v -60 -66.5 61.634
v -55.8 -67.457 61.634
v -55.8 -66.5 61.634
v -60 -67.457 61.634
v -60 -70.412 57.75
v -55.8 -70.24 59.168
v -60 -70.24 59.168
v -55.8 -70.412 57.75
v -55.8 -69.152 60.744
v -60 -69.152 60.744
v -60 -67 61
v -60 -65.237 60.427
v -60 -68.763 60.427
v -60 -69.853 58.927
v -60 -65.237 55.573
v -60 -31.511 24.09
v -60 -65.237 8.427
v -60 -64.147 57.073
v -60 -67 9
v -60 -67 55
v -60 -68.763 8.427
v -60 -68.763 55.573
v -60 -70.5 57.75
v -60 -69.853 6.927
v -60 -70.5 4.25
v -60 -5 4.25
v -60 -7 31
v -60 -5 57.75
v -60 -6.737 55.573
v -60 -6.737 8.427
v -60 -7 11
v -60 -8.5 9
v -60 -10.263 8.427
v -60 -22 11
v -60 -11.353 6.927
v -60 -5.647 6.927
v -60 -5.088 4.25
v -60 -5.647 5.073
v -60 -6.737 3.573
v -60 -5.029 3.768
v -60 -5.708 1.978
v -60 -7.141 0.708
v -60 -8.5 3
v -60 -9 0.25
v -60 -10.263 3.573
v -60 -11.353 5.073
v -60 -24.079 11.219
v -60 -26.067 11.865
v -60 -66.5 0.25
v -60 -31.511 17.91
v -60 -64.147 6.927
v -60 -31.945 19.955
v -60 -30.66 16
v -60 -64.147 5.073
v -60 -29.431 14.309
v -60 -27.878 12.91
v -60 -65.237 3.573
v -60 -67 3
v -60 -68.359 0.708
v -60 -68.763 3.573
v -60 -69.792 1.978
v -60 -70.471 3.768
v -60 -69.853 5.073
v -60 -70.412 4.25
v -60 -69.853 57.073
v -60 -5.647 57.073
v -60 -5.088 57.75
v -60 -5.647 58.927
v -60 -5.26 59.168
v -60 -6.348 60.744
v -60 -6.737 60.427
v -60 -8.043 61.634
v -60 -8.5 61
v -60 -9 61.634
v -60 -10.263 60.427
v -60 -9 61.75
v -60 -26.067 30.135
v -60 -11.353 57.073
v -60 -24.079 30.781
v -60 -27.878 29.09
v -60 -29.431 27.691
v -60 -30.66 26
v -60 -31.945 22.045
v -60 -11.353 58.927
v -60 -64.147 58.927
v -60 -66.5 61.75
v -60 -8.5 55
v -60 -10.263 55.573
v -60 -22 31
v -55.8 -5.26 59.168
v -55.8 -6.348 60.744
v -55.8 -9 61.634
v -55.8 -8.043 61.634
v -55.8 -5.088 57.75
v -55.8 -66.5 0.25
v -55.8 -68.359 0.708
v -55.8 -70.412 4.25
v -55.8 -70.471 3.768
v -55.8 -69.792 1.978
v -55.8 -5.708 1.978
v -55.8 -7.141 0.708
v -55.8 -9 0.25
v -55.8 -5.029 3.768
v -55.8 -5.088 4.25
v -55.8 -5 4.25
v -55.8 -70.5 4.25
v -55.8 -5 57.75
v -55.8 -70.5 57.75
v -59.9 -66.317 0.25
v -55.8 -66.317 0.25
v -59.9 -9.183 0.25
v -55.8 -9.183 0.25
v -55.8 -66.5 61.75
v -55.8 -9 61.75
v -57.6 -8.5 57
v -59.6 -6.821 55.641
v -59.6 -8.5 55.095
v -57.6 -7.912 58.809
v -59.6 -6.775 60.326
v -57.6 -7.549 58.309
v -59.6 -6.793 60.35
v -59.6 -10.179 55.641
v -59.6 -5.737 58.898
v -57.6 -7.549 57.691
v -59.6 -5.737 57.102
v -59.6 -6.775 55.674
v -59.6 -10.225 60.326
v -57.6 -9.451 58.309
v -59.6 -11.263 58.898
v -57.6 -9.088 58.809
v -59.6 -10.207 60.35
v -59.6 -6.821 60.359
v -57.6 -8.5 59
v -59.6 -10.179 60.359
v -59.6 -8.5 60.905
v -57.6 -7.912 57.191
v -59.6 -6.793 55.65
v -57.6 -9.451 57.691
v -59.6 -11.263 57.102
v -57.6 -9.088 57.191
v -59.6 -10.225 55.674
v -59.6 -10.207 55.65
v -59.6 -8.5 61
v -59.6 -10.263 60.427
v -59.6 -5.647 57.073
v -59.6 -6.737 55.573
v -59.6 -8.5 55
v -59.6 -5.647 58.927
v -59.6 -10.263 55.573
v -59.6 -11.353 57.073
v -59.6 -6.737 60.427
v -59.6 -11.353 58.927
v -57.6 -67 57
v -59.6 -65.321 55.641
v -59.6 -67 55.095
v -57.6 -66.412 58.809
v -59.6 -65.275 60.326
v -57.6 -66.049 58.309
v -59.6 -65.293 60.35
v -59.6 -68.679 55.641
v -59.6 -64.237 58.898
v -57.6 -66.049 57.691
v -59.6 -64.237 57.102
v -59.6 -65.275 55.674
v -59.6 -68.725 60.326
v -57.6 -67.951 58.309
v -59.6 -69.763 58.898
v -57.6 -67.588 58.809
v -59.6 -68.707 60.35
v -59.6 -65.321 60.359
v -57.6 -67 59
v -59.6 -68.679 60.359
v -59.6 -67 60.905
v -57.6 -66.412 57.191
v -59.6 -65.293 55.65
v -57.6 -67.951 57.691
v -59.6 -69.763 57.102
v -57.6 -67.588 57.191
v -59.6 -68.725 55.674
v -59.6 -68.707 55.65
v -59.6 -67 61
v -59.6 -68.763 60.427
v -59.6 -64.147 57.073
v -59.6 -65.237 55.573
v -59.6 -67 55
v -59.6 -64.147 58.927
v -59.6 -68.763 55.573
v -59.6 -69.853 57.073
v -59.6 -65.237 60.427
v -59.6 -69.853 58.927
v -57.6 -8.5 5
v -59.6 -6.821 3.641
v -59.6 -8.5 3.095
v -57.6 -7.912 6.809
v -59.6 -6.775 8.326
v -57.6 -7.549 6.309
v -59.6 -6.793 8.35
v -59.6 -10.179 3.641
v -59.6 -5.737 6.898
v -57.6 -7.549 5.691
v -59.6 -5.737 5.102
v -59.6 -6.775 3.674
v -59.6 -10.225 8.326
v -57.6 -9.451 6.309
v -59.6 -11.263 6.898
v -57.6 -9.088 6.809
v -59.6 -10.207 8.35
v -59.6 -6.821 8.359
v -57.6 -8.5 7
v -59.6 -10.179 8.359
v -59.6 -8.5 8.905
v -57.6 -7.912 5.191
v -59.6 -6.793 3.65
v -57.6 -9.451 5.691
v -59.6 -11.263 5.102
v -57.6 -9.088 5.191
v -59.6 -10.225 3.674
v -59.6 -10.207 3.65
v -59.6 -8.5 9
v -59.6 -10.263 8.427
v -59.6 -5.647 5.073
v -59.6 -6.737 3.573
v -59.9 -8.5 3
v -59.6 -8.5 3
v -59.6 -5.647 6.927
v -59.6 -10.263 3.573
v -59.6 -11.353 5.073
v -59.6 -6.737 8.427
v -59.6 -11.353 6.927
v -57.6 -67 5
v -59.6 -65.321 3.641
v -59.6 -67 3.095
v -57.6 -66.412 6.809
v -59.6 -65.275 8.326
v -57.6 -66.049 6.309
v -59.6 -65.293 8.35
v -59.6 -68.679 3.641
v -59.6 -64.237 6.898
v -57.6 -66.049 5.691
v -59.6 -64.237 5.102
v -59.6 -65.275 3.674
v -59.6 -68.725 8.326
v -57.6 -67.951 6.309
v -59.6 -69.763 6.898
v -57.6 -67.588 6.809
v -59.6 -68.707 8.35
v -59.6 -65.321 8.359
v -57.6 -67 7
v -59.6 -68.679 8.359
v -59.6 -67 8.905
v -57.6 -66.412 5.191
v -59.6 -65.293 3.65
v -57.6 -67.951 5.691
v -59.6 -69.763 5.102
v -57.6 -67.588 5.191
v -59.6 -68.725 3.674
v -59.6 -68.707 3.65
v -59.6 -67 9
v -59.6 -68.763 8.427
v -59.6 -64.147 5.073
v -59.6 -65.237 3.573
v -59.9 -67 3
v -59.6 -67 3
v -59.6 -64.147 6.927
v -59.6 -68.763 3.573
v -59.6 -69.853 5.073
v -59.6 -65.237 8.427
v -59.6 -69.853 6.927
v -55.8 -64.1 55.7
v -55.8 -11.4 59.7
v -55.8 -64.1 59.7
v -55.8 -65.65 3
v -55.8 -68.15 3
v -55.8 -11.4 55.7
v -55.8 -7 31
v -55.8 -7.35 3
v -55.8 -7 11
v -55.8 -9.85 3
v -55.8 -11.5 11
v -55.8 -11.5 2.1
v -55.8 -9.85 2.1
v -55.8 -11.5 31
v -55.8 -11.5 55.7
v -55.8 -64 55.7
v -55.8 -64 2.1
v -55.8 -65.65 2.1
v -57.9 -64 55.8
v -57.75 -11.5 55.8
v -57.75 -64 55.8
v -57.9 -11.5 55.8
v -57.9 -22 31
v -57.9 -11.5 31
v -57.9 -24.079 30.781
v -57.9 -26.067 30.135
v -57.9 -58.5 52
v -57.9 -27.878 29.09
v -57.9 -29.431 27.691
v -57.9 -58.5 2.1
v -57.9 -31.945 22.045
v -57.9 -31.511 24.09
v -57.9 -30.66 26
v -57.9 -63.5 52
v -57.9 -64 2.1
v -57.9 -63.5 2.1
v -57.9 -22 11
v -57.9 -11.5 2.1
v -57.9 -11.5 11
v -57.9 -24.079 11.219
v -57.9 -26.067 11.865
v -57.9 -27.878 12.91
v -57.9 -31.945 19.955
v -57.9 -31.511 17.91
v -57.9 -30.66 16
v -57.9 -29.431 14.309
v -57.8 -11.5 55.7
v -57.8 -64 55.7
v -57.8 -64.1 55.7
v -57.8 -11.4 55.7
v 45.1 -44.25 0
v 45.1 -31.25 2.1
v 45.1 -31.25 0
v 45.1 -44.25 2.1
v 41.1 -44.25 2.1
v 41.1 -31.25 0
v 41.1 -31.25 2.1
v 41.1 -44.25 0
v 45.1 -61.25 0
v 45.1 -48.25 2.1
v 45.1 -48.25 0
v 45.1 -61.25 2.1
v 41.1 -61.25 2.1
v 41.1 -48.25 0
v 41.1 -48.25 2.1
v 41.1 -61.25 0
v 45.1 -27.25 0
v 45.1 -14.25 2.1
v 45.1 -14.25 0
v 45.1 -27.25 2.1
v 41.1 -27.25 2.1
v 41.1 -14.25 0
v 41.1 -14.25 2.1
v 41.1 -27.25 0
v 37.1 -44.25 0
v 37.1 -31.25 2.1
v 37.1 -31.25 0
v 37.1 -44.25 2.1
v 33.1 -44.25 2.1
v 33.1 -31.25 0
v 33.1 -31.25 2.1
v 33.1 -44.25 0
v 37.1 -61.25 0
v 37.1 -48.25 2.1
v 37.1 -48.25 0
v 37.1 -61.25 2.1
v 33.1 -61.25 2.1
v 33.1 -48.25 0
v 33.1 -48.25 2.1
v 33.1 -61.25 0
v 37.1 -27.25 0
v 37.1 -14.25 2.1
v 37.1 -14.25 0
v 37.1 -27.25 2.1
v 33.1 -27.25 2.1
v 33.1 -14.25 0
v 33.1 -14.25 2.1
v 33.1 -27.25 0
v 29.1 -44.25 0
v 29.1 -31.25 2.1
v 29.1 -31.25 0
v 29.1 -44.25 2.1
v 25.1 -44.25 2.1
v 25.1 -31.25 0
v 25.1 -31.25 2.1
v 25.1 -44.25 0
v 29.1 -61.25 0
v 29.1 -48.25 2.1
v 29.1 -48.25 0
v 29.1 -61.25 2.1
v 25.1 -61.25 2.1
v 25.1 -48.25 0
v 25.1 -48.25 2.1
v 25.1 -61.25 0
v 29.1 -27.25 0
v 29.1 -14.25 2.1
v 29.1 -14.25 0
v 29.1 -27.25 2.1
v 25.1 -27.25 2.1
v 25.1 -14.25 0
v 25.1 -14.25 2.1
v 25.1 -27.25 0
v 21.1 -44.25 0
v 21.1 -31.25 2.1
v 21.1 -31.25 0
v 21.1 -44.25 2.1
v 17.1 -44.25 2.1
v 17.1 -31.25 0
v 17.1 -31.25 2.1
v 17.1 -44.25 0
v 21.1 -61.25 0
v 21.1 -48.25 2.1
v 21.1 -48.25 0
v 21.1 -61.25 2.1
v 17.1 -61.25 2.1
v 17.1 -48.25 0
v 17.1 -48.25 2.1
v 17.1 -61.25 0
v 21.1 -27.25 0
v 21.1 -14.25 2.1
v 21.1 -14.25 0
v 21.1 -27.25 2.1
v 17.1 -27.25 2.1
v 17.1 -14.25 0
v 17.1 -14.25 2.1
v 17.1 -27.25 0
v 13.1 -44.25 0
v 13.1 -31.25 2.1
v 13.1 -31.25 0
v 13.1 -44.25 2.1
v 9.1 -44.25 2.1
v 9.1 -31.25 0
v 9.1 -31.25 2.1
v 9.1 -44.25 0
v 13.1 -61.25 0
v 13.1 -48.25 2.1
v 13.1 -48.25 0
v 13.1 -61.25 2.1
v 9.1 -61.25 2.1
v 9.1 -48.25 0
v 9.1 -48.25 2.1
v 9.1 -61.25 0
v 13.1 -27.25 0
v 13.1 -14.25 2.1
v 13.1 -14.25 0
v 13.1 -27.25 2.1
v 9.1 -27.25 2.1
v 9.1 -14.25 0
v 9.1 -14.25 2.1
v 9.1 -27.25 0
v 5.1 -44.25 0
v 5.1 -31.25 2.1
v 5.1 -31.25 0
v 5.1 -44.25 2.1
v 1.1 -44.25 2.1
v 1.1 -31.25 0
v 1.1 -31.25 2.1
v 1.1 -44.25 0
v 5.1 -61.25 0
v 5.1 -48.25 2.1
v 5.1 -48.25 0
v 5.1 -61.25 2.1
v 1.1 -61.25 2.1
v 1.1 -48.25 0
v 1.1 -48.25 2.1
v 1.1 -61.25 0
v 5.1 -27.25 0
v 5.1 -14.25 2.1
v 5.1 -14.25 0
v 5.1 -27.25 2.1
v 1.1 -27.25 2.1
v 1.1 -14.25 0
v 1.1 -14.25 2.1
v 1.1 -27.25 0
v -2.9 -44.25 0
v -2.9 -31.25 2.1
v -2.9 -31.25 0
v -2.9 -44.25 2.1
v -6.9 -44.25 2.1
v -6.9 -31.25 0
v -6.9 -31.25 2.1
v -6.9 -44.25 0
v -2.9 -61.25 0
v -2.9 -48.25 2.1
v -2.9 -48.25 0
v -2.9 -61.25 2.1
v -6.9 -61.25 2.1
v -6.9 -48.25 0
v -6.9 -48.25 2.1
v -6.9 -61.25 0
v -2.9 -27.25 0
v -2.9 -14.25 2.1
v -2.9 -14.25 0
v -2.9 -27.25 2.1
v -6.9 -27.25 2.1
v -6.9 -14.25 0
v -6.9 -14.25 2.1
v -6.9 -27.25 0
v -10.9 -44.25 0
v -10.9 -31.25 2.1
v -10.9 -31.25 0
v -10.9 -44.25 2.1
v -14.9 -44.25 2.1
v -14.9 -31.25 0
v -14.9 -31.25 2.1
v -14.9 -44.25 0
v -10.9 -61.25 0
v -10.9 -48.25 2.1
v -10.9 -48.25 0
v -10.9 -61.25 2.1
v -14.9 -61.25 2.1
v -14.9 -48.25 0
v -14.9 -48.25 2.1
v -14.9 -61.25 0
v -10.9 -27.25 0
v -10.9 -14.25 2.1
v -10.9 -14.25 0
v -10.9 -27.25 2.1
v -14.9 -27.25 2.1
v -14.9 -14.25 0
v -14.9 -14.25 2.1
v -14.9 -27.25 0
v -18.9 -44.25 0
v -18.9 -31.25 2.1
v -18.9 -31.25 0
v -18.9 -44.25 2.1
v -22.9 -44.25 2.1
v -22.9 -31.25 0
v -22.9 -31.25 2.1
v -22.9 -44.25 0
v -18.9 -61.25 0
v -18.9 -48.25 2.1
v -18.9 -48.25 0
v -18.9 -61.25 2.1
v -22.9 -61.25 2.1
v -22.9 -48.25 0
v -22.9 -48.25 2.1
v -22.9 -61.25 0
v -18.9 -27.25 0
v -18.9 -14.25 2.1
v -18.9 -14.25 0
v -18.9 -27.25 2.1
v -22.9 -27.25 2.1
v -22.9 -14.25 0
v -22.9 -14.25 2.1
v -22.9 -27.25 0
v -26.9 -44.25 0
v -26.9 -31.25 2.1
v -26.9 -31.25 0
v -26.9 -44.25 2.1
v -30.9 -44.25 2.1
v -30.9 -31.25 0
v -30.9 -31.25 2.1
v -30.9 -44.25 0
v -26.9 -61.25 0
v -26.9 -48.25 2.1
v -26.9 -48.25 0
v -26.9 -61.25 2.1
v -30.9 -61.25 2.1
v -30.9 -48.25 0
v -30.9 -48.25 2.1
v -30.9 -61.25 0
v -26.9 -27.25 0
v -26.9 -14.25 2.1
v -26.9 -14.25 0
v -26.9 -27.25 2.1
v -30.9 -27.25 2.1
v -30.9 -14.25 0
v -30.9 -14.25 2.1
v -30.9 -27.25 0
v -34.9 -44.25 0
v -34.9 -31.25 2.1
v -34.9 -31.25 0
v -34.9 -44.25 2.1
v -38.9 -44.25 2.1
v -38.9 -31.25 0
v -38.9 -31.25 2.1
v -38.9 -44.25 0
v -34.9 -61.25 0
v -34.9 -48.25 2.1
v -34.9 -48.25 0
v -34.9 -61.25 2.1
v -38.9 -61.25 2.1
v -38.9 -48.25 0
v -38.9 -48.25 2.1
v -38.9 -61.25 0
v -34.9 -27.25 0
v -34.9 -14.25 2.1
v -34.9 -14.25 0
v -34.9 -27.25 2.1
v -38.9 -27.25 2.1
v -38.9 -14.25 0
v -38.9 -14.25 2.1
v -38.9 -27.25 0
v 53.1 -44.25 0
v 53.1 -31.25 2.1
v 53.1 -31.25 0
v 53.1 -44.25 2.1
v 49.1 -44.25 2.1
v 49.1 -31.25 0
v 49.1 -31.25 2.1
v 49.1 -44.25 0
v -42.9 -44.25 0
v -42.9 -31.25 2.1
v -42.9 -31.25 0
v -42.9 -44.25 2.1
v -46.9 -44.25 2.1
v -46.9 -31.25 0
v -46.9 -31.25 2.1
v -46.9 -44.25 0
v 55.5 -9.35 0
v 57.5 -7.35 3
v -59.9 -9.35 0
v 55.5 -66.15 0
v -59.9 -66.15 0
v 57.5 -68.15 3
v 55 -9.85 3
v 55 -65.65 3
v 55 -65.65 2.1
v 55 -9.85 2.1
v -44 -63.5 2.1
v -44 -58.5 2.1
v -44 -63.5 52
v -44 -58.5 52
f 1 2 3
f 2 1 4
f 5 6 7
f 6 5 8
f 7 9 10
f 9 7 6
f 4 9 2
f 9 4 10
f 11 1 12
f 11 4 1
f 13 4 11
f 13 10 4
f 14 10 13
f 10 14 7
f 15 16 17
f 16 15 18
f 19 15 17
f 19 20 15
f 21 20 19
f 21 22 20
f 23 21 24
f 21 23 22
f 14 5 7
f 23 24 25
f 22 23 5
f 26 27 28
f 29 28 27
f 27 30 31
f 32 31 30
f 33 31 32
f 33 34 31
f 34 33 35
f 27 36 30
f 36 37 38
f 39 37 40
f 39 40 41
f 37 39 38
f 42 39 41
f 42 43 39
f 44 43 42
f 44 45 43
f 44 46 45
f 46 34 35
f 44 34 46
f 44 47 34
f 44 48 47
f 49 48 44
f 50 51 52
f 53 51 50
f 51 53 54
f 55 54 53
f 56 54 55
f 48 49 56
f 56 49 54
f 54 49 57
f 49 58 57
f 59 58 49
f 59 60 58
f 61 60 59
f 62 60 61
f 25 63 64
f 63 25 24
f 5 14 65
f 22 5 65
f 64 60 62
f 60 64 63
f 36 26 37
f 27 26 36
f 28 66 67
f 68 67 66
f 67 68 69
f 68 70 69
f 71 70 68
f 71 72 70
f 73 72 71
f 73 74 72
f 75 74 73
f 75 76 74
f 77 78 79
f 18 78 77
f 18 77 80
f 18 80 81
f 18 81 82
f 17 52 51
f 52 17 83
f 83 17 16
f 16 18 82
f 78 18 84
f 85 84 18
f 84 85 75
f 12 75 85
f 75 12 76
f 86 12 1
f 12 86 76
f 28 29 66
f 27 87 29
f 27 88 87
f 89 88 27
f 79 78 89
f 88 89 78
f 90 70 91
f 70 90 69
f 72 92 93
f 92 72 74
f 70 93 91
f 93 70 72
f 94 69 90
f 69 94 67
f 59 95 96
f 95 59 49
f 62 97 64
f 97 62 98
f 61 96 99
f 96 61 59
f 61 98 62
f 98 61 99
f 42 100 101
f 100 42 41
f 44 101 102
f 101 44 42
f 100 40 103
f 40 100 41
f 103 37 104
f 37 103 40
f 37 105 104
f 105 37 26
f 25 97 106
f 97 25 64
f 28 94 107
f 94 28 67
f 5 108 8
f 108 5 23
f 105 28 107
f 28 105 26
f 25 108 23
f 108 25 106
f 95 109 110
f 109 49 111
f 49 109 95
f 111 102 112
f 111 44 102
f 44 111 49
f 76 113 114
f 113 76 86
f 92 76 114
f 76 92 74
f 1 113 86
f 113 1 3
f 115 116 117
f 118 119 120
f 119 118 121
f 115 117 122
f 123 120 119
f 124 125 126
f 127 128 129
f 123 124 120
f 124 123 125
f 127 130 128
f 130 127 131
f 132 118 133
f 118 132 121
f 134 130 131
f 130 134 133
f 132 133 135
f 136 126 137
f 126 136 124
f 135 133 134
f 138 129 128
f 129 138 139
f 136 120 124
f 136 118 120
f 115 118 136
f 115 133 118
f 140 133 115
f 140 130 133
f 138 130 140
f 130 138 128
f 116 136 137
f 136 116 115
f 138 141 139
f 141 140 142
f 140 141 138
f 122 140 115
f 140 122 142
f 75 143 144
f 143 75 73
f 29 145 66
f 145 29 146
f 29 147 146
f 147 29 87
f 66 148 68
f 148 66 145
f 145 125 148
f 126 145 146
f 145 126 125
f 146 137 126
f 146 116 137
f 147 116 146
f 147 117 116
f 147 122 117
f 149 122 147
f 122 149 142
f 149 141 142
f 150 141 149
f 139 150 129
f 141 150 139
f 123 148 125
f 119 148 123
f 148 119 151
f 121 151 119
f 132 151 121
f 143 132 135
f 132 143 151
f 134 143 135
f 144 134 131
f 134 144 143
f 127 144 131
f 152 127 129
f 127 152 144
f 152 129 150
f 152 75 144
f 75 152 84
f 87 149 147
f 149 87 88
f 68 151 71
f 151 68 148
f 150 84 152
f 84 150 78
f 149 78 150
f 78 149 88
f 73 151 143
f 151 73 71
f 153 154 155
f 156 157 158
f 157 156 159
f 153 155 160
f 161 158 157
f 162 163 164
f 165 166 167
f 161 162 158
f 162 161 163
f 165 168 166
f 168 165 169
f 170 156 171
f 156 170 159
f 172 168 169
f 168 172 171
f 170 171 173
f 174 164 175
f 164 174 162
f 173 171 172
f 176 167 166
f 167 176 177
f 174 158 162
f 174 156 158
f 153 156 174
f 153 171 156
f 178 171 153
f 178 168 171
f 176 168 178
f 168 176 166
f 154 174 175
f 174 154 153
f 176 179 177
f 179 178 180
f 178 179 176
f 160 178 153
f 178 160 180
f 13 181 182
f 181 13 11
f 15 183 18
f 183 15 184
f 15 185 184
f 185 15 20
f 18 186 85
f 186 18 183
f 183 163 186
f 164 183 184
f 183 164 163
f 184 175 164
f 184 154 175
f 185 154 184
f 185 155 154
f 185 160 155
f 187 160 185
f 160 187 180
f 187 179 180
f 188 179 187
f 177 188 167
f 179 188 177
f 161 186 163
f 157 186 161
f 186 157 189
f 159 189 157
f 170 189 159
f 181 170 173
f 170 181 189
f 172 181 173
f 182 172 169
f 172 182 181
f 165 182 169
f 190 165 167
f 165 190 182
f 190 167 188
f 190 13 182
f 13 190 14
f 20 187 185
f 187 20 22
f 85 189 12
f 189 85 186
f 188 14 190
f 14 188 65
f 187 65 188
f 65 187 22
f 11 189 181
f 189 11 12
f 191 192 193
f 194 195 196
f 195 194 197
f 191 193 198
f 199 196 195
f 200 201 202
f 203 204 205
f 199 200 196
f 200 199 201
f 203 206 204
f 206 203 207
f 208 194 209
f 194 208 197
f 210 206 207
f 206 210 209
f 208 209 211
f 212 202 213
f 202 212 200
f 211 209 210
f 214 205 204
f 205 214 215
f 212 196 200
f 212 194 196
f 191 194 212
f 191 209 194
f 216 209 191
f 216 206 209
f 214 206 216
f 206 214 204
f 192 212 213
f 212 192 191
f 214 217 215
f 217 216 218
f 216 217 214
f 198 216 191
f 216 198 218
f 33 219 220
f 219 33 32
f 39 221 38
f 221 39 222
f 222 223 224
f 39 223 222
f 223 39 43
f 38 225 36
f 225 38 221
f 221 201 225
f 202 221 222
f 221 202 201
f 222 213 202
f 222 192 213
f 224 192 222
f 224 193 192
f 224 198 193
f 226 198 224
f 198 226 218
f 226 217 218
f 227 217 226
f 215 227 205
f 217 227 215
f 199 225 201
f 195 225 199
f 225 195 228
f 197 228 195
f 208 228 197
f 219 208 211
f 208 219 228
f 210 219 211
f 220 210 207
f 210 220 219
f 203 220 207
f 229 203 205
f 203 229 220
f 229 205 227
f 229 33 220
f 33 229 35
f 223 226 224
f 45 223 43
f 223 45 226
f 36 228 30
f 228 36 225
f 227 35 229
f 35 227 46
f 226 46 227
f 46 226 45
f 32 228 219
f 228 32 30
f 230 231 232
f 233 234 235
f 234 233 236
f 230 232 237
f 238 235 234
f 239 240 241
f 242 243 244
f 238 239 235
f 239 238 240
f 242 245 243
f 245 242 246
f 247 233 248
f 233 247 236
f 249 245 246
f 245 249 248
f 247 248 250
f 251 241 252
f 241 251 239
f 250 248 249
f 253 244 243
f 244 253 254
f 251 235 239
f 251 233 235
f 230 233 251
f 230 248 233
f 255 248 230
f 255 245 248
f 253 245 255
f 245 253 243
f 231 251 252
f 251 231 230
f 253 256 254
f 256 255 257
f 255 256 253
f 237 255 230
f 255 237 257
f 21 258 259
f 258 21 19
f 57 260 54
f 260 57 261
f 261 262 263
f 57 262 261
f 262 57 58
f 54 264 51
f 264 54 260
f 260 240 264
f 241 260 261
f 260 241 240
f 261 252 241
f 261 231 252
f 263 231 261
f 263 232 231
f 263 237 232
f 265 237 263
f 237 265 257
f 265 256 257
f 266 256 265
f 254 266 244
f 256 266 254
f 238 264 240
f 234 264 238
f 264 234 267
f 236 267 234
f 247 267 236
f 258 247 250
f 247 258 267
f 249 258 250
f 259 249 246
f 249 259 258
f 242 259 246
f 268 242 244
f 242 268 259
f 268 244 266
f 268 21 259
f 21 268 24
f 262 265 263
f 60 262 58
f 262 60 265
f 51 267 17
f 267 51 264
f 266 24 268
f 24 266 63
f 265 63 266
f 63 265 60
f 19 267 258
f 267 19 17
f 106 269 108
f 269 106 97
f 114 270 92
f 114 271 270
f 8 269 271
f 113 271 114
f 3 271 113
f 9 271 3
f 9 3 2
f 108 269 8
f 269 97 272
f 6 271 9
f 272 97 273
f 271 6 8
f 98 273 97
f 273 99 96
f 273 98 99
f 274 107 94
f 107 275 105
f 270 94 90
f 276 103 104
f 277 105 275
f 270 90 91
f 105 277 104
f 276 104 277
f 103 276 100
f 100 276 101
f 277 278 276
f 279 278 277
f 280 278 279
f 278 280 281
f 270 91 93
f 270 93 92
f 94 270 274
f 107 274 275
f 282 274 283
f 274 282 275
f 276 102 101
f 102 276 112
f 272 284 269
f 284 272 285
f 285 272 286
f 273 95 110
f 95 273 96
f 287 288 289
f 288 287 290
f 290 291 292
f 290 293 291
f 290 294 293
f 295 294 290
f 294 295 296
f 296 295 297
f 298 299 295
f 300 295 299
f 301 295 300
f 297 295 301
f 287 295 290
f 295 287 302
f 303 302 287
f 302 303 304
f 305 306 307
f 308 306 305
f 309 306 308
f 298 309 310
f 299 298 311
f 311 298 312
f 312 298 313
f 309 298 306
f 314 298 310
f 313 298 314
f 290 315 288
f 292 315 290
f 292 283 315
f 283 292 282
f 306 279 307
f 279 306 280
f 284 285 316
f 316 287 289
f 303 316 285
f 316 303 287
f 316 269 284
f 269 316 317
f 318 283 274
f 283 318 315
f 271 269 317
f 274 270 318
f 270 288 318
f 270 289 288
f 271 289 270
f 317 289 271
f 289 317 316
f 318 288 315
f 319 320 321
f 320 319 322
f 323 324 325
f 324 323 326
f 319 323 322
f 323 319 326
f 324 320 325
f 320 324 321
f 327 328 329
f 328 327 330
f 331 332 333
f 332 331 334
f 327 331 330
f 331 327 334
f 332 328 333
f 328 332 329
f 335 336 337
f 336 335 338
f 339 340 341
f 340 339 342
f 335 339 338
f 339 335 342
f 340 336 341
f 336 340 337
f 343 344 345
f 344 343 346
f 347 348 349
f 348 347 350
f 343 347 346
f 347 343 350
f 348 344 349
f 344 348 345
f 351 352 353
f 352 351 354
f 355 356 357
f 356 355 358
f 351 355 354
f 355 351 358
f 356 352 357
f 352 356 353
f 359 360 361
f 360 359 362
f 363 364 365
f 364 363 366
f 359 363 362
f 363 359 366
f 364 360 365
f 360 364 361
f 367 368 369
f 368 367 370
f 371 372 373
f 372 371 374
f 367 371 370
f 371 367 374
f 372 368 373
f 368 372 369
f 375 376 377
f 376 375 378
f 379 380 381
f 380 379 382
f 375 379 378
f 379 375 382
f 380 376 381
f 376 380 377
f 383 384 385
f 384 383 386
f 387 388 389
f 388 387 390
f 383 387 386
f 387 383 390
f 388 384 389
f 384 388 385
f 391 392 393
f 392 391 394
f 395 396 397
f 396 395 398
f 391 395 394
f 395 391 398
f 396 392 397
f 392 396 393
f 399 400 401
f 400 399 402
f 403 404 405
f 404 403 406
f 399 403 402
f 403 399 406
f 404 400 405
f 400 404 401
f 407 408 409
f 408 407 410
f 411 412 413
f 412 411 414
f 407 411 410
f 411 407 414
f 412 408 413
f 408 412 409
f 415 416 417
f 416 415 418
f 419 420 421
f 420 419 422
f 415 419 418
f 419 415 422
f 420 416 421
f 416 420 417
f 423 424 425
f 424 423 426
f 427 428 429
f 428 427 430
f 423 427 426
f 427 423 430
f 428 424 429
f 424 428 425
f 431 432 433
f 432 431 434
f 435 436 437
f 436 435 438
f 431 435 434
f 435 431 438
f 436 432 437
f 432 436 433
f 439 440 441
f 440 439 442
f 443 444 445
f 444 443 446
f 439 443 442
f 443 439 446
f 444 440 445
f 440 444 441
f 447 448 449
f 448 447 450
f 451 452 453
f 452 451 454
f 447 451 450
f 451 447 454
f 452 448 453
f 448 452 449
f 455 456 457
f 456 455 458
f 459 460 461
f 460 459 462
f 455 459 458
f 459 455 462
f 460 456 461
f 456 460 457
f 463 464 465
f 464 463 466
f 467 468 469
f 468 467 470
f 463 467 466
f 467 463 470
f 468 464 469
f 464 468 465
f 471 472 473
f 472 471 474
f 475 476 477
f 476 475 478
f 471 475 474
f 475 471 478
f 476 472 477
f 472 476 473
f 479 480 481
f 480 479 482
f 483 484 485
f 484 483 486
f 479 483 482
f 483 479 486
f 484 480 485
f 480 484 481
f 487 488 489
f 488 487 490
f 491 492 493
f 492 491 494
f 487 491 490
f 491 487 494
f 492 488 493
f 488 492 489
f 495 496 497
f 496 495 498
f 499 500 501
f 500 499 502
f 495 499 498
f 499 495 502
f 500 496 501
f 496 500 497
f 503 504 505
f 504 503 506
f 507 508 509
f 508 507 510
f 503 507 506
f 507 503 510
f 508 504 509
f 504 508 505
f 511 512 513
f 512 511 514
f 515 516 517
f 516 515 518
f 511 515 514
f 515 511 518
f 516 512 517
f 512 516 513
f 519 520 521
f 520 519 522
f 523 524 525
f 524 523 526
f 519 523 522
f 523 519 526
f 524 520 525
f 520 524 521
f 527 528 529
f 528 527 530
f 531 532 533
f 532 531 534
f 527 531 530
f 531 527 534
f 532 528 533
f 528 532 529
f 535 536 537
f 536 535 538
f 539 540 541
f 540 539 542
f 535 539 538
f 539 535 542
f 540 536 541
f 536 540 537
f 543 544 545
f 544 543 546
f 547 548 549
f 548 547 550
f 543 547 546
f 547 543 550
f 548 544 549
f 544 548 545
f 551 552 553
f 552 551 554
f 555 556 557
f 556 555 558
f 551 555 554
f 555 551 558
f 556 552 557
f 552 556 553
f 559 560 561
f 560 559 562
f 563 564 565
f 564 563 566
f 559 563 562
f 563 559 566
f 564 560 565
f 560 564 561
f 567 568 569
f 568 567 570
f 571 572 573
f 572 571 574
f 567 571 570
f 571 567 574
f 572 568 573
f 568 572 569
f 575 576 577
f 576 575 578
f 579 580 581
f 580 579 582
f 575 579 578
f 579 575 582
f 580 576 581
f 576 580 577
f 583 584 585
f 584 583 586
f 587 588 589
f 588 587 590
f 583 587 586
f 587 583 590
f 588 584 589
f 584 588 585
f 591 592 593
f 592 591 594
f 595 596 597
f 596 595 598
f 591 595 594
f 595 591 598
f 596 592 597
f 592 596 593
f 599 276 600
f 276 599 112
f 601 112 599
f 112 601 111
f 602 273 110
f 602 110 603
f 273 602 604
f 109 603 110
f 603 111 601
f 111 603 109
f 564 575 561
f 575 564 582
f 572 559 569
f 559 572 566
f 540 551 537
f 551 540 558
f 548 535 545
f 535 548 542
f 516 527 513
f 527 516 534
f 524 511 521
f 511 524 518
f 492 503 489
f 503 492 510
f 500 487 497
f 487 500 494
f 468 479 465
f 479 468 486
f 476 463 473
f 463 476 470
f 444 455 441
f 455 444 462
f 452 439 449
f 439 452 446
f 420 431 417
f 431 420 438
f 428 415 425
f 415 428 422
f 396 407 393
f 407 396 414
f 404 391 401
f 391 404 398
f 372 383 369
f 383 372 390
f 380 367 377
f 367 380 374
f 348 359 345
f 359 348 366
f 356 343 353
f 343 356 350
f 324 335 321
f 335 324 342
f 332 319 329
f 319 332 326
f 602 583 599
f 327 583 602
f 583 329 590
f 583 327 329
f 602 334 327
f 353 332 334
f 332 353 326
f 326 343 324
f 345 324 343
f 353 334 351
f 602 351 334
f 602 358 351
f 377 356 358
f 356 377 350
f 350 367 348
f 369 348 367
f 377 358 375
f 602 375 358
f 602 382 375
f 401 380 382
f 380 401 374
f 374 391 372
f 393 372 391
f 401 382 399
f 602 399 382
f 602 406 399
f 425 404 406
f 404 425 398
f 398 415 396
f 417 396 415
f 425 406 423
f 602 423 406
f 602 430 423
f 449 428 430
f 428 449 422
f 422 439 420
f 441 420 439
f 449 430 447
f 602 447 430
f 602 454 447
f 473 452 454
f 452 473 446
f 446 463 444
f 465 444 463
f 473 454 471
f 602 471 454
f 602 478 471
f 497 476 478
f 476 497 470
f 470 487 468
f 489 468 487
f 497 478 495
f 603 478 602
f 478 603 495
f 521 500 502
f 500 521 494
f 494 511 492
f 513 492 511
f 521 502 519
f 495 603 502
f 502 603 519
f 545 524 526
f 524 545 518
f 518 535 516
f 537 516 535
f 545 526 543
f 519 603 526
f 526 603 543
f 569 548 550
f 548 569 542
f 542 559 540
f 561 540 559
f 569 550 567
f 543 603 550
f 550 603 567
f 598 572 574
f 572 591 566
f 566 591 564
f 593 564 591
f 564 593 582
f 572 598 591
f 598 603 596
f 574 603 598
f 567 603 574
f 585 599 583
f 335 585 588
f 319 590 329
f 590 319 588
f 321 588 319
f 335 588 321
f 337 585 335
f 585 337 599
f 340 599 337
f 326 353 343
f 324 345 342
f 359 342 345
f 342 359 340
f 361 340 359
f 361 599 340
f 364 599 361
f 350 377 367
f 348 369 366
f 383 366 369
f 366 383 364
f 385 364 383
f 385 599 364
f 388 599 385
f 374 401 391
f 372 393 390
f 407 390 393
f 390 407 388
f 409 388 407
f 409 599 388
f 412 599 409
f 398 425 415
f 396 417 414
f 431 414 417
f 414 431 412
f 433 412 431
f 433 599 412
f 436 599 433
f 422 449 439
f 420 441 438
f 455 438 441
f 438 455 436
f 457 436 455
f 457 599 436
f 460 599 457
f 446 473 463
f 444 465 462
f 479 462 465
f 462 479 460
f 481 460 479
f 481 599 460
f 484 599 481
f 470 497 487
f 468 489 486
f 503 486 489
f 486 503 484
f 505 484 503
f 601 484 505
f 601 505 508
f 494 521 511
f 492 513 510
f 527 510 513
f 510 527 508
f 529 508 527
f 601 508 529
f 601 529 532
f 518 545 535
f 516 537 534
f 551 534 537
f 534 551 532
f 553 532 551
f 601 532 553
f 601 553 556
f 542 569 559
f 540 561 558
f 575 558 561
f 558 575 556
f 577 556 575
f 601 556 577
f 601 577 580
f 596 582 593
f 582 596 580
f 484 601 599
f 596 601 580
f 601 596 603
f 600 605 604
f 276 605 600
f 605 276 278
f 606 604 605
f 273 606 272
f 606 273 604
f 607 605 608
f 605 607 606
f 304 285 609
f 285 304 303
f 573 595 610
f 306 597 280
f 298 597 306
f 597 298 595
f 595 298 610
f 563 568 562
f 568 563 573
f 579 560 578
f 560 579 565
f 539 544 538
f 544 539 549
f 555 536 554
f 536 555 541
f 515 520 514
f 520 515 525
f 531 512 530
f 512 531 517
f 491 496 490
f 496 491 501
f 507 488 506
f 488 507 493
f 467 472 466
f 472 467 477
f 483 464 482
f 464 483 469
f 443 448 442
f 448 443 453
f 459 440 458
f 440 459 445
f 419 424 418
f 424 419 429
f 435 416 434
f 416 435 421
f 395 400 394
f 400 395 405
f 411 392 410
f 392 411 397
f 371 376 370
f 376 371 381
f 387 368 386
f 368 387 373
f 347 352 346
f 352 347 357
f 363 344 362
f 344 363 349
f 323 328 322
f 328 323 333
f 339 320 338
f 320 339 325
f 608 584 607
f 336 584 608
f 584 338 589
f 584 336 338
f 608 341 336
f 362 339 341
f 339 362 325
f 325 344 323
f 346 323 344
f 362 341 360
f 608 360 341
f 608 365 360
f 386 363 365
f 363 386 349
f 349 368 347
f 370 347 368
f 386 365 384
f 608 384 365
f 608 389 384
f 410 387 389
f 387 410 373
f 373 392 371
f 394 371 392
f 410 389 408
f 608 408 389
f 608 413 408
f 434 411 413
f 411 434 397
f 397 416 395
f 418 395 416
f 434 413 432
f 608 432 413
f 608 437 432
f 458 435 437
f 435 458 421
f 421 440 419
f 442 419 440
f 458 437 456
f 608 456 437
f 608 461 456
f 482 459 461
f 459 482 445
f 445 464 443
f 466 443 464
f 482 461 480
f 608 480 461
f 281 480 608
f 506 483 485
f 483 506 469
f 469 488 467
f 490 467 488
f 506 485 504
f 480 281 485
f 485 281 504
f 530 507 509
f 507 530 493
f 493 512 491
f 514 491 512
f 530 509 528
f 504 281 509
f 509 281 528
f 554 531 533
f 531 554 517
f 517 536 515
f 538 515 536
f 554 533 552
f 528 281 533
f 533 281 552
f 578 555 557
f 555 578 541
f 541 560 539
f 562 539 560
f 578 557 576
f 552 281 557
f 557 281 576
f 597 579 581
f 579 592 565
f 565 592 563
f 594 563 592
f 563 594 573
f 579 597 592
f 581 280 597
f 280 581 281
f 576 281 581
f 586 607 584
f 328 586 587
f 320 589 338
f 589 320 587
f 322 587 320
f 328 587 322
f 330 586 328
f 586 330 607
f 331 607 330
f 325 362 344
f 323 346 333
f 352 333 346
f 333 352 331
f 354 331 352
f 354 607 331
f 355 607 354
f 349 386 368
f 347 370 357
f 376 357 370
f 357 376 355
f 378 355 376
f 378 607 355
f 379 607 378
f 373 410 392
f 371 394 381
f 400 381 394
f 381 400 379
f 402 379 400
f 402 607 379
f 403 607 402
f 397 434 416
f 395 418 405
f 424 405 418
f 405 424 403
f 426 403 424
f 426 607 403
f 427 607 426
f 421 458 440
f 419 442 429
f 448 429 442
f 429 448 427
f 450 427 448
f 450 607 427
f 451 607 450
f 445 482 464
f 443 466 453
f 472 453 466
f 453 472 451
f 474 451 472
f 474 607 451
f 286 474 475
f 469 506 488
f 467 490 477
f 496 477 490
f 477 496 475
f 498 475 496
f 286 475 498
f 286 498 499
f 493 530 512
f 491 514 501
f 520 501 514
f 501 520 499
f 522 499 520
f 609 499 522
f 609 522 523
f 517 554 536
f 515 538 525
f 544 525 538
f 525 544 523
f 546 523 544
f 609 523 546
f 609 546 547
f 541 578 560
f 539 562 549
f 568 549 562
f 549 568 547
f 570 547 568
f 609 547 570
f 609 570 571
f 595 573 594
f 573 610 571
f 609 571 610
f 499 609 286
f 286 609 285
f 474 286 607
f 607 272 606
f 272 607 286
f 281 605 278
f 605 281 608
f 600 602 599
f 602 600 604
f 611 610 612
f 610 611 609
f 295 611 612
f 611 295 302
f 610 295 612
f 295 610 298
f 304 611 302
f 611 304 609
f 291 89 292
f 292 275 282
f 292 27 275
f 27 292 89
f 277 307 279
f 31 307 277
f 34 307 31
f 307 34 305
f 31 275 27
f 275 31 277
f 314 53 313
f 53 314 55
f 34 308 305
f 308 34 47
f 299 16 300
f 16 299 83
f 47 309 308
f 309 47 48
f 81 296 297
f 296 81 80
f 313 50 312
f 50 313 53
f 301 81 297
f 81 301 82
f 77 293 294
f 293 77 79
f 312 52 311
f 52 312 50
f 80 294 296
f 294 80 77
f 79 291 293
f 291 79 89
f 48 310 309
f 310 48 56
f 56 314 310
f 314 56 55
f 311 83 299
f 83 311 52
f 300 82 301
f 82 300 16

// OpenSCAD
// Sliding Project box V1.2, now with screw holes!
// John Newman, 25th November 2011
// Edited by Martin Neruda (neruda@reprap4u.cz)

//
// A parameterised enclosure for electronic projects, with support for PCB slots, Screw holes and blocks
// and apertures in the lid and 'top' end.
// The lid slides on, which holds your PCB(s) in.
// Apertures are added with code in the modules "HoleInLid" and "HoleInEnd". See the comments.

// Outside dimensions of the box, and other structural dimensions

OutL = 120;		// Length in mm (puvodne 107)
OutW = 65.5 ; 	// Width in mm
OutD = 62	;		// Depth in mm
WallT = 2.1	;	// Wall thickness (mm)

// PCB supports are defined by the distance to the underside of the PCB, from the top external of the box.
// Supports for the PCB are ribs above and below
PCBgap = 2 ;	// Slot size for PCB to slide into
PCB1 = 38 ;		// Position of first PCB (0 if none)
PCB2 = 0;		// Position of second PCB (0 if none)
PCB3 = 0 ;		// Position of third PCB (0 if none)

// Screw fasteners are positioned by defining their centre , below the top external surface
// They will be positioned on either side at that height. You have to make sure they are not in a PCB slot!
Screws1 = 58 ;	// Position of screws
Screws2 = 6;	// Second set of screws
// Optionally specify the screw hole diameter, to have the holes 'printed'. Otherwise drill them...
ScrewH = 1.0 ;	// Screw hole diameter, in base
ScrewL = 0.0 ;	// Screw hole diameter, in lid

// More obscure parameters
BRad = 4 ;		// Radius of curvature, box edges (mm)
// For wide boxes (>50/60mm) you may want to use this, or make WallT larger for rigidity.
Ridge = 0.5;		// Depth of reinforcing ridge at end of base. 0 to suppress, is WallT multiplier. (not mm!) e.g 1.5

Sdepth = 1.0 ;	// Depth of support ribs for Lid and PCB (mm)
Swidth = 1.4;
// Bevelled ridge to hold lid on (in mm)
RHeight = 3 ;	// Top ridge height
RWidth = 2 ;	// Top ridge width (out over the box)
// Plastic blocks to screw into
ScrewD = 10 ;	// Depth of screw block (which the screw goes into)
ScrewW = 6 ;	// Width of Screw block, and of countersink in lid

Allow = 0.5;		// Allowance for fit of the lid. A gap around it, and elsewhere.


// *******************************  View / render options ********************************

// Print Box on on it's own
//translate([0,0,OutL/2-WallT]) rotate([0,-90,90]) pbox() ;  	// Rotate and position for printing

// Print Lid on it's own
//translate([0,0,OutD/2]) pboxlid() ;					// Rotate and position for printing


// Print both together (if they fit!)

cover();
//box();

module cover(){
difference(){
	union(){
		translate([0,-OutW/2-5,OutD/2]) pboxlid();
		translate([-OutL/2+2,-OutW+2,0]) cube([14,5,OutD-10]);		
	}
	translate([0,-9])union(){
		#translate([-OutL/2-0.1,-13,OutD/2-20]) cube([10,15,20]);
		translate([-OutL/2-0.1,-13,OutD/2-10]) rotate([0,90,0])cylinder(h=10,r=10);
	}
}
}

module box(){
difference(){
	union(){
	translate([0,OutD/2+5,OutL/2-WallT]) rotate([0,-90,90]) pbox();
	translate([-4 +18,OutD+2*WallT+0.2,0]) cube([8,2,30]);
	translate([-4 + 18,OutD+2*WallT+0.2,60]) cube([8,2,30]);
	}
	union(){
	  // Reset hole
	  translate([OutW/2-6,37,38]) rotate([0,90,0]) cylinder(h=10,r=3);
	  // Holes for Arduino Mega2560
	  translate([-OutW/2+6,OutD+6,0]) rotate([90,0,0]){
	  // Holes for zip ties
	  translate([-10,110,35]) rotate([0,90,0])
	  cylinder(h=10,r=1.6);
	  translate([-10,110,45]) rotate([0,90,0])
	  cylinder(h=10,r=1.6);
	  translate([-10,40,35]) rotate([0,90,0])
	  cylinder(h=10,r=1.6);
	  translate([-10,40,45]) rotate([0,90,0])
	  cylinder(h=10,r=1.6);
	}
	// Mounting holes
	translate([0 + 18,OutD,15]) rotate([-90,0,0]) cylinder(r = 3.05, h = 20, $fn = 30);
	translate([0 + 18,OutD,75]) rotate([-90,0,0]) cylinder(r = 3.05, h = 20, $fn = 30);	
	// Hole for X motor and endstop cables
	translate([0,OutD+1,OutD/2-8]) rotate([90,0,0]) cube([50,60,7]);
	}
}
}

// ***************  Your modules to add apertures to  ***************************

// These two modules are where you can put function calls to create holes
// You should use the functions shown in comments, where the
// parameters are in measured from the top left (outside dimension) when looking at the surface (ext).
// Do a test, you'll see how it goes.
// X is across, Y is down, W is x width, D is y depth.

// Called by pboxlid to make any required holes in the lid face
module HoleInLid() {
//	lidround(x,y,w);		// for round holes, X & Y give the centre
//	lidrect(x,y,w,d);		// for rectangular holes, X & Y give the top left corner
// Vent slots	
for (i = [15: 8 : 95] )
{
	lidrect(OutW/2-13/2,i,13,4);
	lidrect(OutW/2-13/2-13-4,i,13,4);
	lidrect(OutW/2-13/2+13+4,i,13,4);
}
	lidrect(OutW/2-13/2,7,13,4);
	lidrect(OutW/2-13/2,103,13,4);
}


// Called by pbox to make any required holes in the end of the box
module HoleInEnd() {
//	endround(x,y,w);		// for round holes, X & Y give the centre
//	endrect(x,y,w,d);		// for rectangular holes, X & Y give the top left corner
	endrect(38,27,24,10); // Power connector
	endrect(43,24,2.5,4) ; // 'teeth'
	endrect(54.5,24,2.5,4) ;
	endrect(42,36,10,14) ; // DC socket
	endrect(11,38,14,12); // USB connector

   // Vent slots
   translate([0,0,0]) {
	endrect(3.4,12,12.7,4);
	endrect(18.7,12,12.7,4);
	endrect(34,12,12.7,4);
	endrect(49.1,12,12.7,4);

	endrect(3.4,18,12.7,4);
	endrect(18.7,18,12.7,4);
	endrect(34,18,12.7,4);
	endrect(49.1,18,12.7,4);

	endrect(3.4,6,12.7,4);
	endrect(18.7,6,12.7,4);
	endrect(34,6,12.7,4);
	endrect(49.1,6,12.7,4);
	}

	// Hole for Y, Z motor and endstop cables
	endrect(32,53,30,6);

}


// **************** Main Box and Lib modules  *************************

// The Project Box
module pbox() {
	blen = OutL-WallT*2 ;		// Len of box w/o endplate
	rheight = WallT * Ridge ;	// Ridge height, if any
	slen = OutW-WallT*2+0.2  ;	// Lib support at end length
	union () {
		difference() {
			rotate ([0,90,0]) roundedBox(OutD,OutW,blen,BRad,$fn=40) ;
			translate([WallT*2,0,WallT*2]) rotate ([0,90,0]) roundedBox(OutD+(WallT*2),OutW-(WallT*2),OutL,BRad) ;
			HoleInEnd() ;
		}
		topridge() ;		// Add a ridge around the top to hold the lid on
		// Add support to hold the lid up at the sides
		support(OutD/2-RHeight-0.5) ;		
		// Support the end of the lid
		translate([-(OutL/2-WallT*2+0.1),OutW/2-WallT-0.1,OutD/2-RHeight-0.6-Sdepth]) rotate([0,0,-90]) cube([slen,Swidth,Sdepth]) ;
		// Optional reinforcing ridge
		if (Ridge != 0) {
			translate([OutL/2-WallT,-OutW/2+BRad,-OutD/2+WallT+rheight-0.1]) rotate([0,180,0]) halfslab(rheight*2,OutW-BRad*2,rheight) ;
		}
		if (PCB1 != 0) {
			support(OutD/2 - PCB1) ;	// Support under the PCB
			support(OutD/2 - (PCB1 - Sdepth - PCBgap)) ;	// Support over the PCB
		}
		if (PCB2 != 0) {
			support(OutD/2 - PCB2) ;	// Support under the PCB
			support(OutD/2 - (PCB2 - Sdepth - PCBgap)) ;	// Support over the PCB
		}
		if (PCB3 != 0) {
			support(OutD/2 - PCB3) ;	// Support under the PCB
			support(OutD/2 - (PCB3 - Sdepth - PCBgap)) ;	// Support over the PCB
		} 
		if (Screws1 != 0) {
			translate([OutL/2-WallT,OutW/2-ScrewW/2-Allow,OutD/2-Screws1]) rotate([0,-90,0]) sblock(ScrewW,ScrewH,ScrewD) ;
			translate([OutL/2-WallT,-(OutW/2-ScrewW/2)+Allow,OutD/2-Screws1]) rotate([0,90,180]) sblock(ScrewW,ScrewH,ScrewD) ;
		}
		if (Screws2 != 0) {
			translate([OutL/2-WallT,OutW/2-ScrewW/2-Allow,OutD/2-Screws2]) rotate([0,-90,0]) sblock(ScrewW,ScrewH,ScrewD) ;
			translate([OutL/2-WallT,-(OutW/2-ScrewW/2)+Allow,OutD/2-Screws2]) rotate([0,90,180]) sblock(ScrewW,ScrewH,ScrewD) ;
		}
	}
}

// Sliding lid for Box
module pboxlid() {
	wid = OutW-(WallT*2)-Allow ;
	dadj = Allow ;			// Depth adjustment of end plate, seems to help...
	union() {
		difference() {
			translate([0,0,0]) rotate ([0,90,0]) roundedBox(OutD-dadj,OutW,OutL,BRad) ;
			translate([-(OutL/2-WallT*2),-(OutW+5)/2,-(OutD/2+2.5)]) cube([OutL+5,OutW+5,OutD+5]) ;
			// Hollow out end plate
			//translate([-(OutL/2-WallT),-(OutW/2)+ScrewW+Allow+WallT,-(OutD/2)+0.1]) cube([10,OutW-(ScrewW+WallT+Allow)*2,OutD-WallT*3]) ;
			translate([-(OutL/2-WallT),-(OutW/2)+ScrewW+Allow,-(OutD/2)+0.1]) cube([10,OutW-(ScrewW+Allow)*2,OutD-WallT*3]) ;
			// Support wedge
			//translate([WallT*2-OutL/2+0.1,-(OutW/2)+ScrewW+Allow+WallT-0.1,OutD/2-WallT])
			//		rotate([0,180,0]) halfslab(WallT,OutW-(ScrewW+WallT+Allow-0.1)*2,WallT*2) ; 
			translate([WallT*2-OutL/2+0.1,-(OutW/2)+ScrewW+Allow-0.1,OutD/2-WallT])
					rotate([0,180,0]) halfslab(WallT,OutW-(ScrewW+Allow-0.1)*2,WallT*2) ; 
			// Screw countersinks as req
			if (Screws1 != 0) {
				translate([0.3-OutL/2,OutW/2-ScrewW/2-Allow,-OutD/2+Screws1]) rotate([0,90,0]) countersink() ;
				translate([0.3-OutL/2,-(OutW/2-ScrewW/2)+Allow,-OutD/2+Screws1]) rotate([0,90,0])  countersink() ;
			}
			if (Screws1 != 0 && ScrewL != 0) {
				translate([-(OutL/2 + 2),OutW/2-ScrewW/2-Allow,-OutD/2+Screws1])
					rotate([0,90,0]) cylinder(WallT*4,ScrewL/2,ScrewL/2,$fn=8) ;
				translate([-(OutL/2 + 2),-(OutW/2-ScrewW/2)+Allow,-OutD/2+Screws1])
					rotate([0,90,0]) cylinder(WallT*4,ScrewL/2,ScrewL/2,$fn=8) ;
			}
			if (Screws2 != 0) {
				translate([0.3-OutL/2,OutW/2-ScrewW/2-Allow,-OutD/2+Screws2]) rotate([0,90,0]) countersink() ;
				translate([0.3-OutL/2,-(OutW/2-ScrewW/2)+Allow,-OutD/2+Screws2]) rotate([0,90,0])  countersink() ;
			}
			if (Screws2 != 0 && ScrewL != 0) {
				translate([-(OutL/2 + 2),OutW/2-ScrewW/2-Allow,-OutD/2+Screws2])
					rotate([0,90,0]) cylinder(WallT*4,ScrewL/2,ScrewL/2,$fn=8) ;
				translate([-(OutL/2 + 2),-(OutW/2-ScrewW/2)+Allow,-OutD/2+Screws2]) 
					rotate([0,90,0]) cylinder(WallT*4,ScrewL/2,ScrewL/2,$fn=8) ;
			}
		}
		render() {
			translate([-(OutL/2-0.1),0,-OutD/2+RHeight]) rotate([180,0,0]) platform(RHeight,wid,wid-(RWidth*2),OutL-WallT-Allow) ;
		}
	}
}

// ****************** Worker modules  ************************

module countersink() {
	difference() {
		union() {
			cylinder(WallT,ScrewW/2,1) ;
			translate([0,0,-(WallT-0.1)]) cylinder(WallT,ScrewW/2,ScrewW/2) ;
		}
	}
}

// Platform bevelled on three sides
// Parameters are height, width at base, width at top and length
module platform(h,wb,wt,l) {
	difference() {
		polyhedron (points=[[0,-(wb/2),0],[l,-(wb/2),0],[l,(wb/2),0],[0,(wb/2),0], [0,-(wt/2),h],[l,-(wt/2),h],[l,(wt/2),h],[0,(wt/2),h] ], 
			triangles=[[0,1,5],[0,5,4],[1,2,6],[1,6,5],[2,3,7],[2,7,6],[0,4,7],[0,7,3],[4,5,6],[4,6,7],[3,2,1],[3,1,0],]) ;
		translate([l/2-(RWidth+Allow),0,h/2-WallT]) cube([l,wt-1,h],true) ;
		translate([l-RWidth,-(OutW/2+4),RHeight]) rotate([0,90,0]) halfslab(RHeight,OutW+8,RWidth) ;
		HoleInLid() ;			// Call user code for aperature
	}
}

// Block for Screws
module sblock(outs,ins,len) { 
	cone = 20 ;
	outr = outs/2 - 1.8;
	inr = ins/2 ;
	outL = outr * 0.87;
	outS = outr/2 ;
	inL = inr * 0.87 ;
	inS = inr /2 ;
	difference() {
		union() {
			cylinder(len,outs/2,outs/2) ;
			translate([0,0,len-((sin(cone)*outs/2))]) rotate([-cone,0,0],[0,0,len]) cylinder((outs/2)/tan(cone),outs/2,0) ;
		}
		if (ins !=0) {
			translate([0,0,-2]) cylinder(h=10,r=1);
		}
	}
}


// size is a vector [w, h, d]
module roundedBox(width, height, depth, radius) {
	size=[width, height, depth];
	cube(size - [2*radius,0,0], true);
	cube(size - [0,2*radius,0], true);
	for (x = [radius-size[0]/2, -radius+size[0]/2],
		y = [radius-size[1]/2, -radius+size[1]/2]) {
		translate([x,y,0]) cylinder(r=radius, h=size[2], center=true);
	}
}

//  Kind of triangle cross section beam w->X; d->Y; h->Z
module halfslab(w,d,h) {
	polyhedron ( points = [[0, 0, h], [0, d, h], [0, d, 0], [0, 0, 0], [w, 0, h], [w, d, h]], 
		triangles = [[0,3,2], [0,2,1], [3,0,4], [1,2,5], [0,5,4], [0,1,5],  [5,2,4], [4,2,3], ]);
}

// Top ridge which retains the lid
module topridge() {
	blen = 0 ;
	translate([(OutL-WallT*2)/2-0.1, -(OutW/2-WallT+0.1),(OutD/2)-(RHeight+0.1)]) rotate([0,0,90]) halfslab(RWidth+0.2, OutL-(WallT*3), RHeight ) ;
	translate([-(OutL-WallT*4)/2+0.1, (OutW/2-WallT+0.1),(OutD/2)-(RHeight+0.1)]) rotate([0,0,-90]) halfslab(RWidth+0.2, OutL-(WallT*3), RHeight ) ;

	translate([-(OutL/2-WallT*2+0.1),- (OutW/2-WallT+0.1),(OutD/2)-(RHeight+0.1)]) rotate([0,0,0]) halfslab(RWidth+0.2, OutW-(WallT*2), RHeight ) ;
}

// Support ridge for lid or PCB
module support(top) {
	translate([0,-(OutW/2-(WallT-0.1)),top]) rib() ;
	translate([0,(OutW/2-(WallT-0.1)-Swidth),top]) rib() ;
}

//Rib of support
module rib() {
	len = OutL - (WallT*3) - Allow ;			// Allow for 1 wall thickness at one end, 2 at the other, and an Allowance
	translate([-len/2 +0.1,0,-Sdepth]) cube([len,Swidth,Sdepth]) ;
}

module endround(x,y,w) {
	translate([-(10+OutL-WallT*4)/2,OutW/2-x,OutD/2-y]) rotate([0,90,0]) cylinder(10,w/2,w/2) ;
}

module endrect(x,y,w,d) {
	translate([-(10+OutL-WallT*4)/2,OutW/2-w-x,OutD/2-y]) rotate([0,90,0]) cube([d,w,10]) ;
}

module lidround(x,y,w) {
	translate([OutL-y,OutW/2-x,-10]) cylinder(20,w/2,w/2) ;
}

module lidrect(x,y,w,d) {
	translate([OutL-d-y,OutW/2-w-x,-8]) cube([d,w,20]) ;
}
